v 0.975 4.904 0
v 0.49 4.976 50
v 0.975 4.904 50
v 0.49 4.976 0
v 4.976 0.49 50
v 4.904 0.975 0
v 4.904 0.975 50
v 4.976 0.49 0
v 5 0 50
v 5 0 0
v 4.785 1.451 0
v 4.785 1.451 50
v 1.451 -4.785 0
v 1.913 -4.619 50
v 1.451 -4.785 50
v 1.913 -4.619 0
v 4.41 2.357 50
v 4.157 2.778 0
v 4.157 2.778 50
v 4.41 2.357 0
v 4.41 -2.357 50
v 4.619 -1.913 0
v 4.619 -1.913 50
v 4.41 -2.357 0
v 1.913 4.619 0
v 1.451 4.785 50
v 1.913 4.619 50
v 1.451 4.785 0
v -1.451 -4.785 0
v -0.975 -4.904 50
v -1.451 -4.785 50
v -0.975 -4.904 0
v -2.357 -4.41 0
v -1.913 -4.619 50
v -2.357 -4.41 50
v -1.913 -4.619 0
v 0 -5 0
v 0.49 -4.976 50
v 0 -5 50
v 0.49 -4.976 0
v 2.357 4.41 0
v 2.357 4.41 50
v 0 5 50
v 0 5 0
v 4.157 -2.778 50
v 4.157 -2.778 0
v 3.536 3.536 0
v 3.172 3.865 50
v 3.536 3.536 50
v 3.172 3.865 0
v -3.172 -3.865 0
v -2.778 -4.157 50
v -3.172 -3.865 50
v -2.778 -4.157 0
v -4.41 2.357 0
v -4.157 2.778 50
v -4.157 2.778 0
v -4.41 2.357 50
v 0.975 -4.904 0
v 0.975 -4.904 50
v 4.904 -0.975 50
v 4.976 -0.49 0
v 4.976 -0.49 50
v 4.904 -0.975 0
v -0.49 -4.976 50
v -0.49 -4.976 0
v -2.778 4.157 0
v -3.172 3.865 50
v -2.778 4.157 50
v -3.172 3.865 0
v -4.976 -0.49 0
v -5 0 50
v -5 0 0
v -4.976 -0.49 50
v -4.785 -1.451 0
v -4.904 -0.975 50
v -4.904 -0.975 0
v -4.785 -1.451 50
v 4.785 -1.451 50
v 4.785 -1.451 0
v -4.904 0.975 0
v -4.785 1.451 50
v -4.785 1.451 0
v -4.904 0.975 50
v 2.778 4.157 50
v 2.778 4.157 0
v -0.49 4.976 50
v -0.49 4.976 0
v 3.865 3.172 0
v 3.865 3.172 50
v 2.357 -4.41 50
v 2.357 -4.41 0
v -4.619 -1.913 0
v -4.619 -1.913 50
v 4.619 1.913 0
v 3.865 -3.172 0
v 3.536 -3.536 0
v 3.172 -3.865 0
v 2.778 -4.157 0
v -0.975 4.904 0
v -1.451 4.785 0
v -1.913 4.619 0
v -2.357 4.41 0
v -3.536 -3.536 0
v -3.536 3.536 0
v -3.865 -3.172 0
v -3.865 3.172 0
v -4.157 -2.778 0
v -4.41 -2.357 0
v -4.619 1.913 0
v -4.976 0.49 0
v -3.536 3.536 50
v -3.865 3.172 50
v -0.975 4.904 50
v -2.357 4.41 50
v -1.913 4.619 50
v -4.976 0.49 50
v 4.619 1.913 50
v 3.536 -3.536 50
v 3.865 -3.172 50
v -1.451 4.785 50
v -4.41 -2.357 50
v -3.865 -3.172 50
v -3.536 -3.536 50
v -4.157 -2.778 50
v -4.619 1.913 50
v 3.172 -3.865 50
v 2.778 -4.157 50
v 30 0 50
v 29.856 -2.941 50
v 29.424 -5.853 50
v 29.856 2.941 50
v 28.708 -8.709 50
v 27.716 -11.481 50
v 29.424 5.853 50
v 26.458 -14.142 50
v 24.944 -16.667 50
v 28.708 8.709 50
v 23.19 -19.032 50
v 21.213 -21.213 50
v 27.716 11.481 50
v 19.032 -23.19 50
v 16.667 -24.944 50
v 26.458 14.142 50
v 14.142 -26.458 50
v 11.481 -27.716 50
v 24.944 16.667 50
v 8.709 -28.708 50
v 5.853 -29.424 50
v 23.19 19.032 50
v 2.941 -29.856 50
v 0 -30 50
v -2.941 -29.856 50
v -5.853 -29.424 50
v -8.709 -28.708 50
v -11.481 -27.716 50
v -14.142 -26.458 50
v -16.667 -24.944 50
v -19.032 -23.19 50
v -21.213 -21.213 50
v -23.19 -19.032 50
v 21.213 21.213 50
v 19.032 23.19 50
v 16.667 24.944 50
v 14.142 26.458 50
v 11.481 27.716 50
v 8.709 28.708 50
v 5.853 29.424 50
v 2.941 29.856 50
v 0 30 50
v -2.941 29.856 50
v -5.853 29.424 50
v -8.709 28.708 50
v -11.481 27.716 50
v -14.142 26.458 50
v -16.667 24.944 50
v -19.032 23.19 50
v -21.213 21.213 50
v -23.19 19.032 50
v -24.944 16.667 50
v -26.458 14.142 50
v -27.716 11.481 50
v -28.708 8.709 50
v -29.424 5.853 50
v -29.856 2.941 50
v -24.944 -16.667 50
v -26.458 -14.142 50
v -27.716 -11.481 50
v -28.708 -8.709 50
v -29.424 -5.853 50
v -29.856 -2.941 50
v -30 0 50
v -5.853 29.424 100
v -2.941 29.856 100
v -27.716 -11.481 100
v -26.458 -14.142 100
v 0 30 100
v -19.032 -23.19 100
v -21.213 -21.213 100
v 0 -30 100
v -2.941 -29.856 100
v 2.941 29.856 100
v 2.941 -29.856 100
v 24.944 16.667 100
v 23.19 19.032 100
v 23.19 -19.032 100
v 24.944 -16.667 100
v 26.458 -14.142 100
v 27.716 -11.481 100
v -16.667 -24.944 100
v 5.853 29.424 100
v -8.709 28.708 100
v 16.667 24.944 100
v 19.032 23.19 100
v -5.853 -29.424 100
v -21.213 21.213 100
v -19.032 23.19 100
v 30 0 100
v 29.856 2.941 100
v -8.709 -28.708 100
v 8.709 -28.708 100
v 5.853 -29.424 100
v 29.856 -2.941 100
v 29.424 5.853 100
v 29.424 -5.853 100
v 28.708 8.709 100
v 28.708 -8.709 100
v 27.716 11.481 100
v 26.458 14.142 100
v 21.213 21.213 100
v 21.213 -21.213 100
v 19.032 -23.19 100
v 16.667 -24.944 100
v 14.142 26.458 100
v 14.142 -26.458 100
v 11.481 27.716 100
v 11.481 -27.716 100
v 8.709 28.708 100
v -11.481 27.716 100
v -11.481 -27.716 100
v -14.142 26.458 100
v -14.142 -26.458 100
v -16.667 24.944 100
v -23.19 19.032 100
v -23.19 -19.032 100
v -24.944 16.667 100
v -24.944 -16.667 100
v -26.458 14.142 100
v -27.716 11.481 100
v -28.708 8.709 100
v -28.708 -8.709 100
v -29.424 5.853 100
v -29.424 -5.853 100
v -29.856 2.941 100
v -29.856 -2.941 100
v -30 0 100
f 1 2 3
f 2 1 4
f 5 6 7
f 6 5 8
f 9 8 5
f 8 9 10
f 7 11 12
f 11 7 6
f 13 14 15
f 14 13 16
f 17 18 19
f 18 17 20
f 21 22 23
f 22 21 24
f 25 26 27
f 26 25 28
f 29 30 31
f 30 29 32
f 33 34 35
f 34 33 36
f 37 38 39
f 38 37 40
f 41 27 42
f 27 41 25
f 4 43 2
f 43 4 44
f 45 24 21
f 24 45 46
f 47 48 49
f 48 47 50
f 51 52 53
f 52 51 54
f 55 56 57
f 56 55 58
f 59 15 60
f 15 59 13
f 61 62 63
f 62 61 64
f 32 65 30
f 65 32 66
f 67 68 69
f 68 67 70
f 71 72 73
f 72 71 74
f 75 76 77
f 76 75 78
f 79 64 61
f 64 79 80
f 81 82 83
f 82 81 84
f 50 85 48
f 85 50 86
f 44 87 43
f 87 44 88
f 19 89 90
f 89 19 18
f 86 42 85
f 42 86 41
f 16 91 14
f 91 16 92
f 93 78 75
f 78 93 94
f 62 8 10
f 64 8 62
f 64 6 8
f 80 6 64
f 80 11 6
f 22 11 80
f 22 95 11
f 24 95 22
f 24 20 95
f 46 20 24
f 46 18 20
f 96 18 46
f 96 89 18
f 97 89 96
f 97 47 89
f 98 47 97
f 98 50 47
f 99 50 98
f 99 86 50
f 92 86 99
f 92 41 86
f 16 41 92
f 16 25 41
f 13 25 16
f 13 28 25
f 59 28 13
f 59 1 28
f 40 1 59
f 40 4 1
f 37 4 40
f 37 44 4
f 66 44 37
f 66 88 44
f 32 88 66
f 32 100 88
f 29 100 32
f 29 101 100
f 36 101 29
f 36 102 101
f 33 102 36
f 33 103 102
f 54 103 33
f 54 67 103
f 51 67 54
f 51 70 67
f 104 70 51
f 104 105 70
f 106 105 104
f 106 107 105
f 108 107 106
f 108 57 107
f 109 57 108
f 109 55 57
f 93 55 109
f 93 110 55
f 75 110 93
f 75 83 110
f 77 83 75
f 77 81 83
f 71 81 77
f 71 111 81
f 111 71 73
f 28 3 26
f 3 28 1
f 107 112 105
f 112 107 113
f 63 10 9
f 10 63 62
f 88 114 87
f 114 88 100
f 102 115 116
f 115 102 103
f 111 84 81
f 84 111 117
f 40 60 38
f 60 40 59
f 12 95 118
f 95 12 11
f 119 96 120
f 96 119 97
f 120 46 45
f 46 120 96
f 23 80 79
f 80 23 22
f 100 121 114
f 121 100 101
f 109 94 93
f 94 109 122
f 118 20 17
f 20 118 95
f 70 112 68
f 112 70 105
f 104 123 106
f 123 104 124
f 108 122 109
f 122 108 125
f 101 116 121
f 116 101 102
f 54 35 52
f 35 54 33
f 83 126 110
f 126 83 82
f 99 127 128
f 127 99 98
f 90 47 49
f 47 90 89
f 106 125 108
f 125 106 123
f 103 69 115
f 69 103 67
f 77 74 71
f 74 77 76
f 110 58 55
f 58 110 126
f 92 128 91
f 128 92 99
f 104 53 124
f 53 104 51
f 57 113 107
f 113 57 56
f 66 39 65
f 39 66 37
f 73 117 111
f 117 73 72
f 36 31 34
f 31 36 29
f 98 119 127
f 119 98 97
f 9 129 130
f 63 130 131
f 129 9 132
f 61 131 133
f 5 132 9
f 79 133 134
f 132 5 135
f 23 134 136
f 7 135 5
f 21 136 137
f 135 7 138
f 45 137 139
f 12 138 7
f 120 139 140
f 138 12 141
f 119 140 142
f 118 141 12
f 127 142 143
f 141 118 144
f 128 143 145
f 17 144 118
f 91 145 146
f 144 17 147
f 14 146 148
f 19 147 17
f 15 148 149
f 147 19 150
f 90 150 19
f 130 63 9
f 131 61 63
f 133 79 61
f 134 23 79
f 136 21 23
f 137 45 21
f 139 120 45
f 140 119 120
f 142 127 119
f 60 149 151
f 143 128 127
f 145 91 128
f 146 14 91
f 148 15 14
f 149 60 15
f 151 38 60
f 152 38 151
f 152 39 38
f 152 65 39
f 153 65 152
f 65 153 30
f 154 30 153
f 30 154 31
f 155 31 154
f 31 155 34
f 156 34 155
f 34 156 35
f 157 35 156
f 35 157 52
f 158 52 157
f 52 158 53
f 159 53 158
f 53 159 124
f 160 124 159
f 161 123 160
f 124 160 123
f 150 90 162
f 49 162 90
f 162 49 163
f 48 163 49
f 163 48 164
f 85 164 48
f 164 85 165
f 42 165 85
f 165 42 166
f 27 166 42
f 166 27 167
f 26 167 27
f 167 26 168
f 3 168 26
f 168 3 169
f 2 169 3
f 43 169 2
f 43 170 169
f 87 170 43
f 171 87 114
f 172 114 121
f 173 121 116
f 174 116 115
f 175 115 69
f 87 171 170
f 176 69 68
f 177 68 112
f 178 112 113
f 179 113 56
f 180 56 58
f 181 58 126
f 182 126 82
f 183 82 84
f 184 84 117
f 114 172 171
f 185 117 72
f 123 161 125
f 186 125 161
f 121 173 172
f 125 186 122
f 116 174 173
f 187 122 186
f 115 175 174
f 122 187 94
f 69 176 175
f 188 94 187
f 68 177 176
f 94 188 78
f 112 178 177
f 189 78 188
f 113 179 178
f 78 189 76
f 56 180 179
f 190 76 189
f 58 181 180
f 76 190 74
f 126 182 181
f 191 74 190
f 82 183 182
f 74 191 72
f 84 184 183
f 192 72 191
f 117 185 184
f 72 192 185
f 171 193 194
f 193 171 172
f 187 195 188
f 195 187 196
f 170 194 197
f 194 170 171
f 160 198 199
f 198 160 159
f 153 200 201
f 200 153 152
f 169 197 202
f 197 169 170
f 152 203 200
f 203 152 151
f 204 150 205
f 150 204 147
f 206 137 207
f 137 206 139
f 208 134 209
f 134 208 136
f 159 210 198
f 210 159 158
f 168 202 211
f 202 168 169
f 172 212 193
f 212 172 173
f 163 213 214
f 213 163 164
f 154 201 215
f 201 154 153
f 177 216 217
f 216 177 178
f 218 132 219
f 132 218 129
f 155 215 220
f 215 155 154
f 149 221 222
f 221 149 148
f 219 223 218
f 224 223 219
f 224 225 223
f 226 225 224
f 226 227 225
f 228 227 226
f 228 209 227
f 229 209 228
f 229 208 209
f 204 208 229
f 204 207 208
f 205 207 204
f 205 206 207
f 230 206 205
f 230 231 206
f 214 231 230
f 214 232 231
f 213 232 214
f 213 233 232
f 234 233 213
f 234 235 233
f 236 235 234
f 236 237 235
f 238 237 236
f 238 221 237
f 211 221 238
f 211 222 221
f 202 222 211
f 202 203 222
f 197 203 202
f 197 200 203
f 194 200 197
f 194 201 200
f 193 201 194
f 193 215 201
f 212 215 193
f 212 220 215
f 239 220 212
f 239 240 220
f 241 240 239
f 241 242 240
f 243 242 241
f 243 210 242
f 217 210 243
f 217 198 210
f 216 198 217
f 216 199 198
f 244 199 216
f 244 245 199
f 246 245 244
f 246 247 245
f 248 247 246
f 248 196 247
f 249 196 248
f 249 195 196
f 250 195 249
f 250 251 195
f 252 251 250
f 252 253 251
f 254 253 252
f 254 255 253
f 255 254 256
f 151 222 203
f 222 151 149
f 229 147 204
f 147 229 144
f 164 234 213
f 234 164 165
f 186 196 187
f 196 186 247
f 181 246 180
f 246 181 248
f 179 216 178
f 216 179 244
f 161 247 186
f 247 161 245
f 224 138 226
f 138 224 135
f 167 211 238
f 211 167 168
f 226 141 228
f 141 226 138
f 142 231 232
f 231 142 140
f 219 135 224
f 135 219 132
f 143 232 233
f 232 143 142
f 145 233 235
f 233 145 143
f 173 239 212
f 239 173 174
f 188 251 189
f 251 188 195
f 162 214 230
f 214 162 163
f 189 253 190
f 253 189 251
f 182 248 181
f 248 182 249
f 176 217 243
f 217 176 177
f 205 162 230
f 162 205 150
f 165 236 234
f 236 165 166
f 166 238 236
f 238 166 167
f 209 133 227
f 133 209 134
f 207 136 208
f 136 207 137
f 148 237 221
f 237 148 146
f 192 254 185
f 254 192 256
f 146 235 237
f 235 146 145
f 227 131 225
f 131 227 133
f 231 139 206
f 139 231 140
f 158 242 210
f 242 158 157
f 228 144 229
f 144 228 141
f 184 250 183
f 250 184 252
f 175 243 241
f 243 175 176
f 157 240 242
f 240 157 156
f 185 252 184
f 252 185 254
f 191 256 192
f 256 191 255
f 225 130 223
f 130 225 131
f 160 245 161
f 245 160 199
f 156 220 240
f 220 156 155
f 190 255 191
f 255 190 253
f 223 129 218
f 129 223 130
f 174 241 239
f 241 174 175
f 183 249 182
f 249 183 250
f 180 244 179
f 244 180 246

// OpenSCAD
// Lab funnel - printed upright, open at top and bottom
// Units: mm

$fn = 64;

// --- Dimensions ---
spout_od      = 10;   // spout outer diameter
spout_h       = 20;   // spout height (z = 0 to 20)
cone_od_top   = 60;   // cone rim outer diameter (z = 50)
cone_h        = 30;   // cone height (z = 20 to 50)
wall          = 1.6;  // wall thickness everywhere

// --- Derived ---
spout_id      = spout_od - 2 * wall;   // bore diameter
cone_od_bot   = spout_od;             // cone starts at spout diameter

// --- Model ---
union() {
    // Straight spout (tube)
    translate([0, 0, 0])
        cylinder(d = spout_od, h = spout_h);

    // Cone: od = cone_od_bot at z = spout_h, od = cone_od_top at z = spout_h + cone_h
    translate([0, 0, spout_h])
        linear_extrude(height = cone_h)
            circle(d = cone_od_bot);
    translate([0, 0, spout_h + cone_h])
        rotate([0, 0, 90])
            linear_extrude(height = cone_od_top - cone_od_bot)
                circle(d = cone_od_top);
}

// Cut the bore through the full height
translate([0, 0, -1])
    difference() {
        cylinder(d = spout_id, h = spout_h + cone_h + 2);
        translate([0, 0, -1])
            cylinder(d = spout_id + 0.02, h = spout_h + cone_h + 2);
    }
